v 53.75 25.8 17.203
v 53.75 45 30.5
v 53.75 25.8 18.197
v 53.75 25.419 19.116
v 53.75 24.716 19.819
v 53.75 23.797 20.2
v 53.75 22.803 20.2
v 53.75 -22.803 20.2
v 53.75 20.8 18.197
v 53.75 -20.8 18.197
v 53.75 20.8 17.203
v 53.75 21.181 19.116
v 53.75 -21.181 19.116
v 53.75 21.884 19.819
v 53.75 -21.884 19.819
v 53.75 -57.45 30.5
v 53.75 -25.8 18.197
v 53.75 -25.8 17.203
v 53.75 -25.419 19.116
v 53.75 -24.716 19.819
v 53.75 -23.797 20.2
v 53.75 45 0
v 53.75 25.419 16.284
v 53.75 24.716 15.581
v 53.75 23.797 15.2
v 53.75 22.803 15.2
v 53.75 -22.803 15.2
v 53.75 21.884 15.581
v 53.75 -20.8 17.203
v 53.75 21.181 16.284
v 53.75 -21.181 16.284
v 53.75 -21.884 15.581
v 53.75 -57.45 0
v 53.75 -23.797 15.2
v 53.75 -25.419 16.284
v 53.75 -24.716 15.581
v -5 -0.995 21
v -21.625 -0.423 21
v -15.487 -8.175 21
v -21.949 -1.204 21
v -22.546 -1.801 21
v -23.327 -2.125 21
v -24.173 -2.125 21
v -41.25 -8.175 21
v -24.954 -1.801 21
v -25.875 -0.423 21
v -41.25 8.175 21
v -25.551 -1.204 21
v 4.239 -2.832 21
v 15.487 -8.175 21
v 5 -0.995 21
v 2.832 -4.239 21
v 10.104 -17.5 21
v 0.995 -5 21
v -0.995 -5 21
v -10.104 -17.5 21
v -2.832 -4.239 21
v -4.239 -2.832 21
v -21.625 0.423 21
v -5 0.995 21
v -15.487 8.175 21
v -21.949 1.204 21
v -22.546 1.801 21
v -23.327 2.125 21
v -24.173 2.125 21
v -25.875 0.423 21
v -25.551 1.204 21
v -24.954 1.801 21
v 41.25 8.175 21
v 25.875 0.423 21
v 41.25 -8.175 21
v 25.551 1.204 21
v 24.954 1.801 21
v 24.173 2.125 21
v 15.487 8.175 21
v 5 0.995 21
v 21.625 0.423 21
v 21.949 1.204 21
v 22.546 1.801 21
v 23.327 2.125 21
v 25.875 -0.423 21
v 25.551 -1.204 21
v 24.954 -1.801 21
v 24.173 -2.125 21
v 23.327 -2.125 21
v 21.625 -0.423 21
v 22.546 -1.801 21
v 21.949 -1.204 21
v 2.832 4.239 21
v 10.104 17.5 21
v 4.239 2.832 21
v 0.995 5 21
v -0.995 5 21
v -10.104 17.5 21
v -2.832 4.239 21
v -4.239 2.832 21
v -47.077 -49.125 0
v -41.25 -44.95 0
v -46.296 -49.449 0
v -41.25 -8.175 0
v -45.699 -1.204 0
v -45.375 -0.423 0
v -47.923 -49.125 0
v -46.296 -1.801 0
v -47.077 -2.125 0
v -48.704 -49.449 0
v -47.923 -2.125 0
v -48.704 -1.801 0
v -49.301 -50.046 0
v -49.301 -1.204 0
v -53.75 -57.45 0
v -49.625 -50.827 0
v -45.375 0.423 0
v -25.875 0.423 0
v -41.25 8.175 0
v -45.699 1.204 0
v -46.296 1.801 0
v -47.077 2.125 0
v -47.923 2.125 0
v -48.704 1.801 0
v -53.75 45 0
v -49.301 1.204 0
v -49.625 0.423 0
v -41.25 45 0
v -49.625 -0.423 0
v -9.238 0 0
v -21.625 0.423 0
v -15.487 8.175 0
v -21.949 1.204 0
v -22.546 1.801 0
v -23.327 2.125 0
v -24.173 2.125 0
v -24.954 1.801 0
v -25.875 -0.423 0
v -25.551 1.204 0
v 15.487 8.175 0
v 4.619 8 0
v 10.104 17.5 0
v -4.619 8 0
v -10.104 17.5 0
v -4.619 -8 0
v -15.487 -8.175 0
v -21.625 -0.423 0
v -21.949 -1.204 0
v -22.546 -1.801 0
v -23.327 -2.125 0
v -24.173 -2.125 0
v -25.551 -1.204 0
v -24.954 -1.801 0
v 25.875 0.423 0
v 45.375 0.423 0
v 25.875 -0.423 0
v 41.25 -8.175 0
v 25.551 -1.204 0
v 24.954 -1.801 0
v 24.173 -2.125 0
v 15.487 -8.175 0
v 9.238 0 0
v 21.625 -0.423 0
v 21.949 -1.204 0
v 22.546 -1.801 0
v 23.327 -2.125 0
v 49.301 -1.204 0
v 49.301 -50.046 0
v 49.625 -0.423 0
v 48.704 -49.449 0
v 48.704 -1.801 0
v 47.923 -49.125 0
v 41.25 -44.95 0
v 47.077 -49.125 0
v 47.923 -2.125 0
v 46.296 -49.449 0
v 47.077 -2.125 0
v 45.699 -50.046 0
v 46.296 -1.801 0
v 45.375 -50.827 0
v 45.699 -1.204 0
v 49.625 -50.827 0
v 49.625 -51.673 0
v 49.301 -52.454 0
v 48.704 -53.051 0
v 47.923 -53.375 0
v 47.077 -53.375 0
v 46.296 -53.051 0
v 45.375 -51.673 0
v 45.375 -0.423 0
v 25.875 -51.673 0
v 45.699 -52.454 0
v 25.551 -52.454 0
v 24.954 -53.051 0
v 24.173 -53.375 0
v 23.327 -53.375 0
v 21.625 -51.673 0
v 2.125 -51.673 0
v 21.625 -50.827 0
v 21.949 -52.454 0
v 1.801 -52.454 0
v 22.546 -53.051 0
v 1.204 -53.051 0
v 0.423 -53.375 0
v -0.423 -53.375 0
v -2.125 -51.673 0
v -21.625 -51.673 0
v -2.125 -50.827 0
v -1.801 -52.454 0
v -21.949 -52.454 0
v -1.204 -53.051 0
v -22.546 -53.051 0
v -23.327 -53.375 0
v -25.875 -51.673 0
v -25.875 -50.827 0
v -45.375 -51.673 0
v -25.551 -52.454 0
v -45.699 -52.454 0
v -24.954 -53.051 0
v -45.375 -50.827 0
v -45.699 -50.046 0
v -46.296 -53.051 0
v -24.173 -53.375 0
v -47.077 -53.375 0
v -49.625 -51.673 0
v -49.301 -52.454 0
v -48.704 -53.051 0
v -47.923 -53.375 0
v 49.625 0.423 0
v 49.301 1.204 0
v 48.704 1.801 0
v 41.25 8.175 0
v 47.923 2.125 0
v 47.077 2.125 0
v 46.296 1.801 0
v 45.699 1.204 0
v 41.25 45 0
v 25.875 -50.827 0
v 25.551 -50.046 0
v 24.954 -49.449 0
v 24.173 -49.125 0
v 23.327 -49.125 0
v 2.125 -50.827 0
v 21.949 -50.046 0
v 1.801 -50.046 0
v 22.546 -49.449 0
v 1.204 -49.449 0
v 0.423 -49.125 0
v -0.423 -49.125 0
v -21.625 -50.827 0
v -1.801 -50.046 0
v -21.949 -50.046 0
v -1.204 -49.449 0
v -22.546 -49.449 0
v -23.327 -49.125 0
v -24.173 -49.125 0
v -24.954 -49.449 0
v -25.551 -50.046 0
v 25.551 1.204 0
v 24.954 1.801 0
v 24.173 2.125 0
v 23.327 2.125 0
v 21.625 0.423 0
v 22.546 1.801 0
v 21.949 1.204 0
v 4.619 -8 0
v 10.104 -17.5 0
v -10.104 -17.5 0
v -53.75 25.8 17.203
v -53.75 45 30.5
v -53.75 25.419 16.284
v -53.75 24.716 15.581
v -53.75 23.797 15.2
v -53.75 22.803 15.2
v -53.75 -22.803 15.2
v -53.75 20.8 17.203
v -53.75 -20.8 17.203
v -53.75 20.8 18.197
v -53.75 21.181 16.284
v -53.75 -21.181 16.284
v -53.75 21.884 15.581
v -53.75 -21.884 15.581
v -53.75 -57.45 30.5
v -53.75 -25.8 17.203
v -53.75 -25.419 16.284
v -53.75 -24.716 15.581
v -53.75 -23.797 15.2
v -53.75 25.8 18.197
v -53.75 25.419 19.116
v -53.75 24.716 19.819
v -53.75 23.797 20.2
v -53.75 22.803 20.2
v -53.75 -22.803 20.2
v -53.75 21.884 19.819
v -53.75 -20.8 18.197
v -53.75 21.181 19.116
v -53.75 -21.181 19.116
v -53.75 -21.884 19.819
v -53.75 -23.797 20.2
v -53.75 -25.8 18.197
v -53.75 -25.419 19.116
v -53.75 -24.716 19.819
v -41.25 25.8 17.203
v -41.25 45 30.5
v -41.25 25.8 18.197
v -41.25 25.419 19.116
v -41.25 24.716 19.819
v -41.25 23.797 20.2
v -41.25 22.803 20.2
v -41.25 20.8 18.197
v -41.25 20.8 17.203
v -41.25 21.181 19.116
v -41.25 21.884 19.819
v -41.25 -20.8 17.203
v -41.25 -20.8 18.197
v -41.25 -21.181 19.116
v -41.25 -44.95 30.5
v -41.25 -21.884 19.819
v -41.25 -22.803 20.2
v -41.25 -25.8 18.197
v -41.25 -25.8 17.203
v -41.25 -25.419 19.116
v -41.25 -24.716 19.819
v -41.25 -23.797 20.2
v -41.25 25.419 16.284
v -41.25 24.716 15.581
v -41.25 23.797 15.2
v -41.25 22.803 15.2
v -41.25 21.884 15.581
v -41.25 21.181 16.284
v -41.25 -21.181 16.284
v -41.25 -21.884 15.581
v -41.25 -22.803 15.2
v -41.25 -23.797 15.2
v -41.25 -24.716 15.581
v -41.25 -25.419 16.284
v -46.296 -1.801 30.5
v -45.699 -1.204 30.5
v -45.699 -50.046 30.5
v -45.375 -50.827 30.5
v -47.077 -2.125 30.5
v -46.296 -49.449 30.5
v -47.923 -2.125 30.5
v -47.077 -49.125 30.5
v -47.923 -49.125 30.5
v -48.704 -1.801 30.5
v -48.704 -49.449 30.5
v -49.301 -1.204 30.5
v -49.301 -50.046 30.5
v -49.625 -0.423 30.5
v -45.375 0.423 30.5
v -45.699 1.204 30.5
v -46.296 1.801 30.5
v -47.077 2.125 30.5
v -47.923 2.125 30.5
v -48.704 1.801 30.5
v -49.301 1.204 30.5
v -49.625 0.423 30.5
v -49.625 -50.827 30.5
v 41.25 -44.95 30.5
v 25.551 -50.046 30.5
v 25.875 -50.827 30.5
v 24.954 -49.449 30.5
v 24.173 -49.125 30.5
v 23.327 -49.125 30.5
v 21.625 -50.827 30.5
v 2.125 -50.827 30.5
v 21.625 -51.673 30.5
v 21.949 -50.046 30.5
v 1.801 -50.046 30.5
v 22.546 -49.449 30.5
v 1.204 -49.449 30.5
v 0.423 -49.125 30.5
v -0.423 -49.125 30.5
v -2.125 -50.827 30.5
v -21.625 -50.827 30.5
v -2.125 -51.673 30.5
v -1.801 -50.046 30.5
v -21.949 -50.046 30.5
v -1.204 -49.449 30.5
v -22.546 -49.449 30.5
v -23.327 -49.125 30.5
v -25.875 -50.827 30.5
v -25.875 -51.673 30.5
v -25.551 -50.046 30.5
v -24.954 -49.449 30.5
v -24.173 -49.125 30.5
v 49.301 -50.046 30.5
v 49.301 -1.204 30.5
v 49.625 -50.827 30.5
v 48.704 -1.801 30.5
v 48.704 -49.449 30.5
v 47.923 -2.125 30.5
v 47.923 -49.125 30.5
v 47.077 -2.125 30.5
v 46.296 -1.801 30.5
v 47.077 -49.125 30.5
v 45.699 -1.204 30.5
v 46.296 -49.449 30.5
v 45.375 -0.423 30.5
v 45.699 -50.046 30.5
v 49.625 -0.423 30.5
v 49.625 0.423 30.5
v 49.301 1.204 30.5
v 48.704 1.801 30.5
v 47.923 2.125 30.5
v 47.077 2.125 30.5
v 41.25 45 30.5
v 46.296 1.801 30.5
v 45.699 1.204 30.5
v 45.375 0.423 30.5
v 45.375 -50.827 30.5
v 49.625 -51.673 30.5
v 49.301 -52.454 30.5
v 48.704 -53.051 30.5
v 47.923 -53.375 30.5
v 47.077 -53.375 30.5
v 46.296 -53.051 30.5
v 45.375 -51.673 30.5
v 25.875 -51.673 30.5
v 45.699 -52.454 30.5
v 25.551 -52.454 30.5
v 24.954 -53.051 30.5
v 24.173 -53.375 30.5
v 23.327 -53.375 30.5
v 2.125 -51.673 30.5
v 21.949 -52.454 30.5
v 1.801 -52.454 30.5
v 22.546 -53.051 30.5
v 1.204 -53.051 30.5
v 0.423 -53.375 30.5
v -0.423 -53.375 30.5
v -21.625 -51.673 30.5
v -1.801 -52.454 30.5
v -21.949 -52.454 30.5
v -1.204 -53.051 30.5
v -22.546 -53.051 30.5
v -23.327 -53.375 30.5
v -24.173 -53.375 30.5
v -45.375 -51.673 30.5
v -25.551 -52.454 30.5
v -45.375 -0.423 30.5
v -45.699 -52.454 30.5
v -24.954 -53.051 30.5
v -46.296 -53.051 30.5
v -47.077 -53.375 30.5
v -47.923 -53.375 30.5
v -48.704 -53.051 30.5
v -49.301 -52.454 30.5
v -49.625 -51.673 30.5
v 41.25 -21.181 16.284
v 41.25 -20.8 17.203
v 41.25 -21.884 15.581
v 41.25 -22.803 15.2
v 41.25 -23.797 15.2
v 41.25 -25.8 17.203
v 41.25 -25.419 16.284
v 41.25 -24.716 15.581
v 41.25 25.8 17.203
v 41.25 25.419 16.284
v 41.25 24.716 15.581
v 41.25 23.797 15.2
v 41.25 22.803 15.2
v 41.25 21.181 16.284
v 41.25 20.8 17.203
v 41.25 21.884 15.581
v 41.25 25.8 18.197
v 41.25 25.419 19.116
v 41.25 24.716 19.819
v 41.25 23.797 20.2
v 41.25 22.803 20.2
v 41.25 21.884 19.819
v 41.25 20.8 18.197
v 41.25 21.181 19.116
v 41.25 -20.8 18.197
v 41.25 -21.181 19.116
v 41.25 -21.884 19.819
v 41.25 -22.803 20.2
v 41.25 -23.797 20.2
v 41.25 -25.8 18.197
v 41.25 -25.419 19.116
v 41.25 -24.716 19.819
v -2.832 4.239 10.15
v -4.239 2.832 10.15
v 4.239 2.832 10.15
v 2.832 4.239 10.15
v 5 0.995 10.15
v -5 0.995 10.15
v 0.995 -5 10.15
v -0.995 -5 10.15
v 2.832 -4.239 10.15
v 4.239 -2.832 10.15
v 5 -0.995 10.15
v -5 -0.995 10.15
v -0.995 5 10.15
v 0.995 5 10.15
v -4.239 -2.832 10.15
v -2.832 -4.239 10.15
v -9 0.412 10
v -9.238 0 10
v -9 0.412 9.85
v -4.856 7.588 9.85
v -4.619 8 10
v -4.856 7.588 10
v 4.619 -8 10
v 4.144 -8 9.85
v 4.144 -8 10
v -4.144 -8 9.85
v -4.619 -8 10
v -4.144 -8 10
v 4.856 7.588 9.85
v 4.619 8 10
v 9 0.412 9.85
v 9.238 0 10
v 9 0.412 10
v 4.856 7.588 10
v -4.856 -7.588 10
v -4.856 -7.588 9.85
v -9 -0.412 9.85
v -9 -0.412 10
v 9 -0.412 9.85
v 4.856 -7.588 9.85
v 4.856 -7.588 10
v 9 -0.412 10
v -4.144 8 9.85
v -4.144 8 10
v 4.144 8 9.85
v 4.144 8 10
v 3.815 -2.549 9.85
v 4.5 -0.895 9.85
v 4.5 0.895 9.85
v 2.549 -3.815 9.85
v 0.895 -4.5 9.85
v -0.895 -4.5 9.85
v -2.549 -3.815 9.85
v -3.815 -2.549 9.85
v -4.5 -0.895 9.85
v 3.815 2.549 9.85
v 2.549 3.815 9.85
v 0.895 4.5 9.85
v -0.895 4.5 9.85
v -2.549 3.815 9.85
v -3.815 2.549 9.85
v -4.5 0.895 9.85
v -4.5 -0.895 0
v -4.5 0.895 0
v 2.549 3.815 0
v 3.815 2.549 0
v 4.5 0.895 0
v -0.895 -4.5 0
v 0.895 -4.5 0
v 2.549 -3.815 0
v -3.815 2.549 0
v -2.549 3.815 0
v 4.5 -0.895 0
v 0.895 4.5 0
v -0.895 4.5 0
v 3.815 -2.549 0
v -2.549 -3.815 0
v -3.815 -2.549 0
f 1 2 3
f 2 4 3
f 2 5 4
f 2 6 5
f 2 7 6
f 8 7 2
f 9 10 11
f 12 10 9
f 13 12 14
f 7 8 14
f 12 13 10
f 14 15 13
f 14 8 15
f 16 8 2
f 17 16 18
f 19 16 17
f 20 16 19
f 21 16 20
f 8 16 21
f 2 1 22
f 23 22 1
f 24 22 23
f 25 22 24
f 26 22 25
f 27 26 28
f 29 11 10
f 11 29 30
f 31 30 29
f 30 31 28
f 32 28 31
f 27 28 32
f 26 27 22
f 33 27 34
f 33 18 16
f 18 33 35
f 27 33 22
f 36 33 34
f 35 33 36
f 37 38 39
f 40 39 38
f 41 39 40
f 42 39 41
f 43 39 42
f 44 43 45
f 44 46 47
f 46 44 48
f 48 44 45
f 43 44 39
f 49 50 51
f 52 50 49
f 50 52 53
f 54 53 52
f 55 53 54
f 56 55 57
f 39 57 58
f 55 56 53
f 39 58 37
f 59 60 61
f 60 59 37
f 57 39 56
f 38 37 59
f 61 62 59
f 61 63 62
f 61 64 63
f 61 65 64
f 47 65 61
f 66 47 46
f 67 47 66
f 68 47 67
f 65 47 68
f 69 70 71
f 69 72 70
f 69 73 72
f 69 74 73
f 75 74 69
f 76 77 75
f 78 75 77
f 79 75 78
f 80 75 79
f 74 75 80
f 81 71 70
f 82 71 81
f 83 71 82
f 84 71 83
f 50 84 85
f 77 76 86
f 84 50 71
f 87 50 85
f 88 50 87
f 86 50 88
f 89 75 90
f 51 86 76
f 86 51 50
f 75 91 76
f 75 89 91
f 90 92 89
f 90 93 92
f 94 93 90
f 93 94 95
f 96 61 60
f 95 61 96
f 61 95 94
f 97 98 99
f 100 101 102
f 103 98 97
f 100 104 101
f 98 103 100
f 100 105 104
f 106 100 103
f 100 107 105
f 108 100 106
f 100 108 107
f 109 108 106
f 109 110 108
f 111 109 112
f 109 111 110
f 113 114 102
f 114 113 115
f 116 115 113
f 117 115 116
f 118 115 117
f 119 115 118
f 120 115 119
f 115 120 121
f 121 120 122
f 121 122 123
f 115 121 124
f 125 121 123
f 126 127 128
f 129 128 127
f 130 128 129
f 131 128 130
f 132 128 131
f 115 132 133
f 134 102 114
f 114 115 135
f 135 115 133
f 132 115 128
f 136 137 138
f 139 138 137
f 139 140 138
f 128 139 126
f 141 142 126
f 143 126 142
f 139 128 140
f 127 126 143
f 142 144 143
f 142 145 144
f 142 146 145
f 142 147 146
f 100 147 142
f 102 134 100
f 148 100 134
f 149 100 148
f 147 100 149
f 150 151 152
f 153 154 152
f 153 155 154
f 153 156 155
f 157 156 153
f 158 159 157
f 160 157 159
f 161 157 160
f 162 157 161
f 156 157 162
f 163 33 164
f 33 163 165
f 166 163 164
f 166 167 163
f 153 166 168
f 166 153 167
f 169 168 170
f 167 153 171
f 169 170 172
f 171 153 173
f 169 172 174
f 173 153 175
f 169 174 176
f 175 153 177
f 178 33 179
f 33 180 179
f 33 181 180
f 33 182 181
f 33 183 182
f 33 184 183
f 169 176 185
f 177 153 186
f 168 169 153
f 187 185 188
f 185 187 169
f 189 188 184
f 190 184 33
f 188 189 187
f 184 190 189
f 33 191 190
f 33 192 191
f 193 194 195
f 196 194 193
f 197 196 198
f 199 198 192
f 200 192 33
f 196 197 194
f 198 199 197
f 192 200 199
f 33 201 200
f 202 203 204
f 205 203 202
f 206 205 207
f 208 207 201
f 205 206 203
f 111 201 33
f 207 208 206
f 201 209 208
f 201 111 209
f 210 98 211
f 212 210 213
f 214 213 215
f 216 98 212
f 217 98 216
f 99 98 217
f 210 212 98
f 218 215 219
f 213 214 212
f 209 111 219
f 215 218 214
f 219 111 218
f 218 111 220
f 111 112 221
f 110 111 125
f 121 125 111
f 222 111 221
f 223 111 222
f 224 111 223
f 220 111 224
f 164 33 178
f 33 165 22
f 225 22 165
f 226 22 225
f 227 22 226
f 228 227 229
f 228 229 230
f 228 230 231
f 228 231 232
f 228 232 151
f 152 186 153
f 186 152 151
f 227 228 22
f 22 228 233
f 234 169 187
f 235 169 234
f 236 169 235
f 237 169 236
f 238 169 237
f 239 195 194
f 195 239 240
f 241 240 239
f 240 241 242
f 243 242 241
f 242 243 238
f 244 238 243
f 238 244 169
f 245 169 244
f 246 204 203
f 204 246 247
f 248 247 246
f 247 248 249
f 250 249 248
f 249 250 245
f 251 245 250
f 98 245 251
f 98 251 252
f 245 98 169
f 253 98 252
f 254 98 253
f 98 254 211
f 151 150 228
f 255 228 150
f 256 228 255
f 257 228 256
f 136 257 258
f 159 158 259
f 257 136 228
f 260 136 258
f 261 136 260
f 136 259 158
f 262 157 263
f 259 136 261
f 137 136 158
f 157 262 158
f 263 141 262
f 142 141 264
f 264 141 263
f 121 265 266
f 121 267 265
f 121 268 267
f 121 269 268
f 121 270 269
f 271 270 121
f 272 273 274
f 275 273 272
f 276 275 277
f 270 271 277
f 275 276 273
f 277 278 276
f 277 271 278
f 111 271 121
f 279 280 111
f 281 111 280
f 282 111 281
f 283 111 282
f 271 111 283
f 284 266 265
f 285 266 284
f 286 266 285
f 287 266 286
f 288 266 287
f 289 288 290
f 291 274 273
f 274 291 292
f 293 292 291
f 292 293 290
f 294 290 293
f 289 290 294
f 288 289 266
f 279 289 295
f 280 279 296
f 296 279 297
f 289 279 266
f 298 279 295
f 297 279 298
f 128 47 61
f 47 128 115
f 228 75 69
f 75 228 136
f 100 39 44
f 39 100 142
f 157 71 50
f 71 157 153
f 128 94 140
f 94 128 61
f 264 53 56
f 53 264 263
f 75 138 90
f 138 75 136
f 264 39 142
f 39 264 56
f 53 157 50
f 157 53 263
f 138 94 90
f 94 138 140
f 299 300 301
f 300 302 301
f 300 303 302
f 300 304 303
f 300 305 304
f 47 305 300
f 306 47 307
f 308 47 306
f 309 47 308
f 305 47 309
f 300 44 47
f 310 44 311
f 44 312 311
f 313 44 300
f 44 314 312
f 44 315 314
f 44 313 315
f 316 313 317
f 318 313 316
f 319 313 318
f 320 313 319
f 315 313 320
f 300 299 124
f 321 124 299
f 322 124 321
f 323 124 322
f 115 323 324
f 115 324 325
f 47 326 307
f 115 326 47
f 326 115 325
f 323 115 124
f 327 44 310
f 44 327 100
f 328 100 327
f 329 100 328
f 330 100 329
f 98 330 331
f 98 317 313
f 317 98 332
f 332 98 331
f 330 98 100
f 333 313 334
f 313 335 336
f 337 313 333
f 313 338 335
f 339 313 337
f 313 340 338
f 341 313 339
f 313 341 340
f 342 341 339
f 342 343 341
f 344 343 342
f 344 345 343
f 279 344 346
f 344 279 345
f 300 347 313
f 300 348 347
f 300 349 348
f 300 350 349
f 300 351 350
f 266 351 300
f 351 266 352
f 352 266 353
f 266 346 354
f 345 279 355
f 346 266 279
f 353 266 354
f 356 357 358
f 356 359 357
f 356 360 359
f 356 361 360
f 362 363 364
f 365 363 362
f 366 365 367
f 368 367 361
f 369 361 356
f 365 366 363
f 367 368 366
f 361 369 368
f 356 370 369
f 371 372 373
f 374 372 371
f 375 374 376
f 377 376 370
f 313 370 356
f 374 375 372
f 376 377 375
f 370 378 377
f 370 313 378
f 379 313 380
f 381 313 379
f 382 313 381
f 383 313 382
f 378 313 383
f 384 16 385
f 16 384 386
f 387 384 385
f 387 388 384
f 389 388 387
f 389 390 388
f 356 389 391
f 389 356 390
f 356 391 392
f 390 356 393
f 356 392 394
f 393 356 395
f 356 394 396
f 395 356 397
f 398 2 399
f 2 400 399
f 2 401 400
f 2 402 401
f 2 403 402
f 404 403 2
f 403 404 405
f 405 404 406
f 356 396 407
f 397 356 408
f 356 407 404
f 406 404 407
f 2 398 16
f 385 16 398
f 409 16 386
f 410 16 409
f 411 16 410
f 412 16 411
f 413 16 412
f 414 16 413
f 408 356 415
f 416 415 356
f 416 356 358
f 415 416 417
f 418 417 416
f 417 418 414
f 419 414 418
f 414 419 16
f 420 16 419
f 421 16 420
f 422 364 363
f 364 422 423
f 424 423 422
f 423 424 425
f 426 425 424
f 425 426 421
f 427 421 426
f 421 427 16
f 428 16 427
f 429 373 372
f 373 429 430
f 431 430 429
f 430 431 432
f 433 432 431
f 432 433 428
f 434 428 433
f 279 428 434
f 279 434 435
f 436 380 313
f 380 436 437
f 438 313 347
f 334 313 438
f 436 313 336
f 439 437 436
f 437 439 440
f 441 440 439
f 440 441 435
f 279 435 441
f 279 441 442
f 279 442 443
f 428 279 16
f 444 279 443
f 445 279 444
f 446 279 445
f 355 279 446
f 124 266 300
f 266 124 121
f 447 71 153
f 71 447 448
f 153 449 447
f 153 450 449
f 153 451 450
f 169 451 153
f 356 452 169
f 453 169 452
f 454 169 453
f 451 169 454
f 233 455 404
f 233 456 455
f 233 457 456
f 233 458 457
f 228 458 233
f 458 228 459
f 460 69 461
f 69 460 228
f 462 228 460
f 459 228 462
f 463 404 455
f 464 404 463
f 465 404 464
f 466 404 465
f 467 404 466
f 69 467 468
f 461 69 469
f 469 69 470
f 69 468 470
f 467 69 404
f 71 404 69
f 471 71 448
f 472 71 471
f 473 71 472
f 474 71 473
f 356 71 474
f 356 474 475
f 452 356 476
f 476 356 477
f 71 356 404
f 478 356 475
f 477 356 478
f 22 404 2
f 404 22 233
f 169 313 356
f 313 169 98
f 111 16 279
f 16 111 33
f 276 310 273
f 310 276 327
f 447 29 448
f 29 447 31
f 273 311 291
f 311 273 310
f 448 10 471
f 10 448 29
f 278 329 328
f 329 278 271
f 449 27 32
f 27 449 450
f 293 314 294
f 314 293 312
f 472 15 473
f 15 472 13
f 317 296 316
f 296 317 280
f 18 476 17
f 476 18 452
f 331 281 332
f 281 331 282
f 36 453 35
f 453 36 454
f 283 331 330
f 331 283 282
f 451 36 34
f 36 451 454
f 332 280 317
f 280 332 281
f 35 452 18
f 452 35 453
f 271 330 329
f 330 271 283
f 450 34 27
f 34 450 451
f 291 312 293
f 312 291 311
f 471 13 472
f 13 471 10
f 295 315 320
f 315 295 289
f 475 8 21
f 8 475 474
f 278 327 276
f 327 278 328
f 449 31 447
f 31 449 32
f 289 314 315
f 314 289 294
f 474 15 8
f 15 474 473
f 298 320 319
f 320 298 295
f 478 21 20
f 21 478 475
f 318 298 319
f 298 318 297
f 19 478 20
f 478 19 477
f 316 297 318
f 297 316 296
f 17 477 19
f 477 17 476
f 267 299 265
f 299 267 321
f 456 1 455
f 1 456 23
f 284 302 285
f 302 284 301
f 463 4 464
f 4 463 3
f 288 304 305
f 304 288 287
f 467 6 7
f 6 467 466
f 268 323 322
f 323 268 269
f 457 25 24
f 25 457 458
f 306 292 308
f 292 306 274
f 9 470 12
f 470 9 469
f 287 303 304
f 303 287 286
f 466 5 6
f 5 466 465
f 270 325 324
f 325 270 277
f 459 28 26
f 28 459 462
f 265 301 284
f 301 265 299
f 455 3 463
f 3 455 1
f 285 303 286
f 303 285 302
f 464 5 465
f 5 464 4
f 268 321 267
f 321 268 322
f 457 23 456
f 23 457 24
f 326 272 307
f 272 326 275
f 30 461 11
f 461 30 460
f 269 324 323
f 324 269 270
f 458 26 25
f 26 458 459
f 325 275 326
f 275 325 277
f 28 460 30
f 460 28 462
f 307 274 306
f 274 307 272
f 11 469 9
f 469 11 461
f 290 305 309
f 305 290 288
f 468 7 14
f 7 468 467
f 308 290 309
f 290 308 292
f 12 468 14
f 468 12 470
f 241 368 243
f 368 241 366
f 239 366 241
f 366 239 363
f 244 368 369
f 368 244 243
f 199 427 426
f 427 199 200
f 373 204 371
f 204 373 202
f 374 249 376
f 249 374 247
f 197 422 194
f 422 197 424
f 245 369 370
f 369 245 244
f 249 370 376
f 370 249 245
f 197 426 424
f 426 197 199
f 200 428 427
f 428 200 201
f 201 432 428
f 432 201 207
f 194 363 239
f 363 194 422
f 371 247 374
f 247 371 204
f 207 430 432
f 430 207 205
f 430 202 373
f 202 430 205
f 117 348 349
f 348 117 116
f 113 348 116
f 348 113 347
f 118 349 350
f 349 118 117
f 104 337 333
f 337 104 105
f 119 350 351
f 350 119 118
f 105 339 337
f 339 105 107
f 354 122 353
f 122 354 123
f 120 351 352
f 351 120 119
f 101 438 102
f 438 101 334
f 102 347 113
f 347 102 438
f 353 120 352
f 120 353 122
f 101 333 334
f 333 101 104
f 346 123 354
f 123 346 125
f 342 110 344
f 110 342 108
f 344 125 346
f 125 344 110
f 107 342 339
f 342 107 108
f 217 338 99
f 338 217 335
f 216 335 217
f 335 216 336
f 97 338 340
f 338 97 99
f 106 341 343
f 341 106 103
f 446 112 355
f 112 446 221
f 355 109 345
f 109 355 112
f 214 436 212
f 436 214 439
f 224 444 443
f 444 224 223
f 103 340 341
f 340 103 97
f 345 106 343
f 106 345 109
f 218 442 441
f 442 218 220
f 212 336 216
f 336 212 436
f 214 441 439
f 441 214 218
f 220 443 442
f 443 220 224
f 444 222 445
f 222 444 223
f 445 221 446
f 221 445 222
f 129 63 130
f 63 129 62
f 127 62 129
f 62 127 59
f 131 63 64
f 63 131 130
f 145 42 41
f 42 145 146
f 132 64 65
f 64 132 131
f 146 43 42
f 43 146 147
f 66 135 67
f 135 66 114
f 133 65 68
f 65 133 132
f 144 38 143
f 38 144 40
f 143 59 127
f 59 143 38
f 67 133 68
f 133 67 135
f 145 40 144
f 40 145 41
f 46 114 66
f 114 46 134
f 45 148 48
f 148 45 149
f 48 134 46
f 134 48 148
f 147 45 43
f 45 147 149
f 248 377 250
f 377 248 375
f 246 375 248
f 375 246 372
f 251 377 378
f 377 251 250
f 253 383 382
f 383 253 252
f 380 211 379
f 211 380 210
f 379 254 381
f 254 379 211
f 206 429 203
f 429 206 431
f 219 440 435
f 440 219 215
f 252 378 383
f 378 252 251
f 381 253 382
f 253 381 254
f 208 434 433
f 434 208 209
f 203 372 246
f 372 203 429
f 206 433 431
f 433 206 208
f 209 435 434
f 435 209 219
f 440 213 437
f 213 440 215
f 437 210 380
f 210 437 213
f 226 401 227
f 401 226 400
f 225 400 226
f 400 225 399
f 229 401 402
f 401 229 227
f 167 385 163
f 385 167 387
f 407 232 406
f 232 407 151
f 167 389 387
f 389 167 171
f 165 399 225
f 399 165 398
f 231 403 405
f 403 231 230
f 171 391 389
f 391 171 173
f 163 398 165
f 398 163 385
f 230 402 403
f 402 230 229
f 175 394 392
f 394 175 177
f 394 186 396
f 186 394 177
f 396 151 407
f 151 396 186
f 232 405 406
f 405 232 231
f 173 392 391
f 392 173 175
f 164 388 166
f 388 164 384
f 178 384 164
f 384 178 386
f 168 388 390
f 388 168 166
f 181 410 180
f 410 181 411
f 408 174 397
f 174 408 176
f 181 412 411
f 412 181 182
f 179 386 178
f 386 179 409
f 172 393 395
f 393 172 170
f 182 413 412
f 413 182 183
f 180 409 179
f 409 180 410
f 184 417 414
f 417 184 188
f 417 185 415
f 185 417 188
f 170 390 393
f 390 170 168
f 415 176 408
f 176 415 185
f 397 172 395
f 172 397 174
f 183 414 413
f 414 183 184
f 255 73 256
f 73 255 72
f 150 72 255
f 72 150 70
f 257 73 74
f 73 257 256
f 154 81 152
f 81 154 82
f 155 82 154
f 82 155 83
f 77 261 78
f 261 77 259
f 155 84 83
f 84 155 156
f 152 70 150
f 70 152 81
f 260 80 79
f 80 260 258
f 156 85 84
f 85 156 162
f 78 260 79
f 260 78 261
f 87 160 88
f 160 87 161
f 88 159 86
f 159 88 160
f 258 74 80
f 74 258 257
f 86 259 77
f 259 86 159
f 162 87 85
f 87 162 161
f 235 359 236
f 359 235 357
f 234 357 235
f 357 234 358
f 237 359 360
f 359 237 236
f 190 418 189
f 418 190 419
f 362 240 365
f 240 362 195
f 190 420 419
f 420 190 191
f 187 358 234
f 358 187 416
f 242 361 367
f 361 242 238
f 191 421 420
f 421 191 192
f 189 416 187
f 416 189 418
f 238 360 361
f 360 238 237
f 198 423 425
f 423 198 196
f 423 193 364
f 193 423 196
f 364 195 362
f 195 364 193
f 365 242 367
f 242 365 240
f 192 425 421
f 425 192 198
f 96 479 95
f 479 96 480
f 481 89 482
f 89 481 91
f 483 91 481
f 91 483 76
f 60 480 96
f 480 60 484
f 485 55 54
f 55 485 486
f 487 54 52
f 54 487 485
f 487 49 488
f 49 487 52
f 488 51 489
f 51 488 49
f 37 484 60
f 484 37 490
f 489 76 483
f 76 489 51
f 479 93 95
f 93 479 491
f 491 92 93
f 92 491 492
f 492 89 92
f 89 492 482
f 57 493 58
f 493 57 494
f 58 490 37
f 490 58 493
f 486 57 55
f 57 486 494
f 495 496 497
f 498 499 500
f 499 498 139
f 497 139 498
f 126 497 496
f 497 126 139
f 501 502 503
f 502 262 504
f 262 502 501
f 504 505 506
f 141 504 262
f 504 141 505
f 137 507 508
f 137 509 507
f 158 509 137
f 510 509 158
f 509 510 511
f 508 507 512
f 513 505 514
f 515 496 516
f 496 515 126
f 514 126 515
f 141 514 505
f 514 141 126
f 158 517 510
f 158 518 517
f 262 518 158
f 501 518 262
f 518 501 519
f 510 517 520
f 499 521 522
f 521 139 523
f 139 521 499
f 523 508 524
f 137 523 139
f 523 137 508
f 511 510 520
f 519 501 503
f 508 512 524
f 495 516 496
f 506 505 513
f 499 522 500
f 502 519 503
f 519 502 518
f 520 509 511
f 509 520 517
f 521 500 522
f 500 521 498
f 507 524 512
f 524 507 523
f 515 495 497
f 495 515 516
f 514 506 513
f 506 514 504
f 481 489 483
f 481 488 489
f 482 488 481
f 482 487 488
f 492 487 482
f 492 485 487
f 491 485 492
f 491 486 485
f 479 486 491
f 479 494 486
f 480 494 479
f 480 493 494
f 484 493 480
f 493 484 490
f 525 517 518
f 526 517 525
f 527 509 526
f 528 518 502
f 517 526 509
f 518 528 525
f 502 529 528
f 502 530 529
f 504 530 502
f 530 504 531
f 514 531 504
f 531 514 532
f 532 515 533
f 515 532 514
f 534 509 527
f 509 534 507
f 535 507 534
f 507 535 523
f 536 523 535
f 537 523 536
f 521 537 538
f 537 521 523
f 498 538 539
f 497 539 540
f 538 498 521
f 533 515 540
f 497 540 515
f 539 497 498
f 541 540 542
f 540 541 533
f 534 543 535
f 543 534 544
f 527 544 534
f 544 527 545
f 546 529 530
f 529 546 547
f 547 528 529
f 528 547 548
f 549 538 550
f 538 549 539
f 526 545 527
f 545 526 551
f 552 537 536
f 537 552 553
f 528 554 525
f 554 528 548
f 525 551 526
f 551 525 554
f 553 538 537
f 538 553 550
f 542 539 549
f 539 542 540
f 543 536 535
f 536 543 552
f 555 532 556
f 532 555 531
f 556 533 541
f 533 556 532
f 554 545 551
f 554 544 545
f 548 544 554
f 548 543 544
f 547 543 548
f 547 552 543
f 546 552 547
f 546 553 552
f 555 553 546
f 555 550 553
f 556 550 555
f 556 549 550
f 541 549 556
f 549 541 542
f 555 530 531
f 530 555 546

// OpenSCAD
// file: ../lib/util.scad
left   = -1;
right  = 1;
front  = -1;
rear   = 1;
top    = 1;
bottom = -1;

x = 0;
y = 1;
z = 2;

width  = x;
depth  = y;
height = z;

function accurate_diam(diam,sides) = 1 / cos(180/sides) / 2 * diam;

module hole(diam,len,sides=8) {
  rotate([0,0,180/sides]) {
    cylinder(r=accurate_diam(diam,sides),h=len,center=true,$fn=sides);
  }
}

module accurate_circle(diam,sides=8) {
  rotate([0,0,180/sides]) {
    circle(r=accurate_diam(diam,sides),center=true,$fn=sides);
  }
}

module debug_axes() {
  color("red") {
    translate([50,0,0]) cube([100,.2,.2],center=true);
    translate([0,50,0]) cube([.2,100,.2],center=true);
    translate([0,0,50]) cube([.2,.2,100],center=true);
  }
}

module rounded_square(width,height,diam,resolution=16) {
  hull() {
    for(x=[left,right]) {
      for(y=[front,rear]) {
        translate([x*(width/2-diam/2),y*(height/2-diam/2),0]) {
          accurate_circle(diam,resolution);
        }
      }
    }
  }
}
// main file
include <../lib/util.scad>;

// dimensions seem to be imperial.  :(

extrusion_height = 0.3;

resolution = 16;
vertical_clearance = 5;
length_clearance   = 5;

channel_depth  = 20.5 + vertical_clearance;
channel_length = 80;
overall_length = channel_length + length_clearance*2;
overall_depth  = channel_depth + vertical_clearance;

channel_inner  = 82.5;
channel_outer  = 107.5;
channel_width  = (channel_outer - channel_inner) /2; // something like 1/2 inch
channel_pos_x  = channel_inner/2 + channel_width/2;

brace_width    = 16.35;
brace_height   = 16 + vertical_clearance;

lock_hole_diam     = 5;
lock_hole_from_end = 14.2 + lock_hole_diam/2;
lock_hole_from_top = 10.3 + lock_hole_diam/2;
lock_nut_diam      = 16;
lock_nut_thickness = 10;

lock_screw_diam      = 10; // not true, need to find thread which is likely imperial
lock_screw_safe_diam = 35;

anchor_hole_diam = 4.25;

echo("overall_length/2: ", overall_length/2);
echo("channel_pos_x: ", channel_pos_x);

echo("overall depth: ", overall_depth);

module piccolo_adapter() {
  module body() {
    translate([0,0,brace_height/2]) {
      cube([channel_outer,brace_width,brace_height],center=true);

      rotate([0,0,90]) {
        hole(lock_screw_safe_diam,brace_height,6);
      }
    }

    for(x=[left,right]) {
      translate([x*channel_pos_x,0,overall_depth/2]) {
        cube([channel_width,overall_length,overall_depth],center=true);
      }
    }

    translate([0,-overall_length/2-channel_width/2+0.05,overall_depth/2]) {
      cube([channel_outer,channel_width,overall_depth],center=true);
    }
  }

  module holes() {
    hole(lock_screw_diam,brace_height*3,resolution);

    for(end=[front,rear]) {
      translate([0,end*(channel_length/2-lock_hole_from_end),overall_depth-lock_hole_from_top]) {
        rotate([0,90,0]) {
          hole(lock_hole_diam,channel_outer+1,resolution);
        }
      }
    }

    rotate([0,0,90]) {
      hole(lock_nut_diam,lock_nut_thickness*2,6);
    }

    for(side=[left,right]) {
      for(x=[0,channel_pos_x,channel_pos_x/2]) {
        for(y=[0,-overall_length/2-channel_width/2]) {
          translate([side*x,y,0]) {
            hole(anchor_hole_diam,overall_depth*2+1,resolution);
          }
        }
      }
    }
  }

  module bridges() {
    translate([0,0,lock_nut_thickness]) {
      hole(lock_nut_diam+2,extrusion_height,6);
    }

    translate([0,0,lock_nut_thickness/2]) {
      hole(lock_screw_diam-1,lock_nut_thickness,resolution);
    }
  }

  difference() {
    body();
    holes();
  }

  bridges();
}

piccolo_adapter();
